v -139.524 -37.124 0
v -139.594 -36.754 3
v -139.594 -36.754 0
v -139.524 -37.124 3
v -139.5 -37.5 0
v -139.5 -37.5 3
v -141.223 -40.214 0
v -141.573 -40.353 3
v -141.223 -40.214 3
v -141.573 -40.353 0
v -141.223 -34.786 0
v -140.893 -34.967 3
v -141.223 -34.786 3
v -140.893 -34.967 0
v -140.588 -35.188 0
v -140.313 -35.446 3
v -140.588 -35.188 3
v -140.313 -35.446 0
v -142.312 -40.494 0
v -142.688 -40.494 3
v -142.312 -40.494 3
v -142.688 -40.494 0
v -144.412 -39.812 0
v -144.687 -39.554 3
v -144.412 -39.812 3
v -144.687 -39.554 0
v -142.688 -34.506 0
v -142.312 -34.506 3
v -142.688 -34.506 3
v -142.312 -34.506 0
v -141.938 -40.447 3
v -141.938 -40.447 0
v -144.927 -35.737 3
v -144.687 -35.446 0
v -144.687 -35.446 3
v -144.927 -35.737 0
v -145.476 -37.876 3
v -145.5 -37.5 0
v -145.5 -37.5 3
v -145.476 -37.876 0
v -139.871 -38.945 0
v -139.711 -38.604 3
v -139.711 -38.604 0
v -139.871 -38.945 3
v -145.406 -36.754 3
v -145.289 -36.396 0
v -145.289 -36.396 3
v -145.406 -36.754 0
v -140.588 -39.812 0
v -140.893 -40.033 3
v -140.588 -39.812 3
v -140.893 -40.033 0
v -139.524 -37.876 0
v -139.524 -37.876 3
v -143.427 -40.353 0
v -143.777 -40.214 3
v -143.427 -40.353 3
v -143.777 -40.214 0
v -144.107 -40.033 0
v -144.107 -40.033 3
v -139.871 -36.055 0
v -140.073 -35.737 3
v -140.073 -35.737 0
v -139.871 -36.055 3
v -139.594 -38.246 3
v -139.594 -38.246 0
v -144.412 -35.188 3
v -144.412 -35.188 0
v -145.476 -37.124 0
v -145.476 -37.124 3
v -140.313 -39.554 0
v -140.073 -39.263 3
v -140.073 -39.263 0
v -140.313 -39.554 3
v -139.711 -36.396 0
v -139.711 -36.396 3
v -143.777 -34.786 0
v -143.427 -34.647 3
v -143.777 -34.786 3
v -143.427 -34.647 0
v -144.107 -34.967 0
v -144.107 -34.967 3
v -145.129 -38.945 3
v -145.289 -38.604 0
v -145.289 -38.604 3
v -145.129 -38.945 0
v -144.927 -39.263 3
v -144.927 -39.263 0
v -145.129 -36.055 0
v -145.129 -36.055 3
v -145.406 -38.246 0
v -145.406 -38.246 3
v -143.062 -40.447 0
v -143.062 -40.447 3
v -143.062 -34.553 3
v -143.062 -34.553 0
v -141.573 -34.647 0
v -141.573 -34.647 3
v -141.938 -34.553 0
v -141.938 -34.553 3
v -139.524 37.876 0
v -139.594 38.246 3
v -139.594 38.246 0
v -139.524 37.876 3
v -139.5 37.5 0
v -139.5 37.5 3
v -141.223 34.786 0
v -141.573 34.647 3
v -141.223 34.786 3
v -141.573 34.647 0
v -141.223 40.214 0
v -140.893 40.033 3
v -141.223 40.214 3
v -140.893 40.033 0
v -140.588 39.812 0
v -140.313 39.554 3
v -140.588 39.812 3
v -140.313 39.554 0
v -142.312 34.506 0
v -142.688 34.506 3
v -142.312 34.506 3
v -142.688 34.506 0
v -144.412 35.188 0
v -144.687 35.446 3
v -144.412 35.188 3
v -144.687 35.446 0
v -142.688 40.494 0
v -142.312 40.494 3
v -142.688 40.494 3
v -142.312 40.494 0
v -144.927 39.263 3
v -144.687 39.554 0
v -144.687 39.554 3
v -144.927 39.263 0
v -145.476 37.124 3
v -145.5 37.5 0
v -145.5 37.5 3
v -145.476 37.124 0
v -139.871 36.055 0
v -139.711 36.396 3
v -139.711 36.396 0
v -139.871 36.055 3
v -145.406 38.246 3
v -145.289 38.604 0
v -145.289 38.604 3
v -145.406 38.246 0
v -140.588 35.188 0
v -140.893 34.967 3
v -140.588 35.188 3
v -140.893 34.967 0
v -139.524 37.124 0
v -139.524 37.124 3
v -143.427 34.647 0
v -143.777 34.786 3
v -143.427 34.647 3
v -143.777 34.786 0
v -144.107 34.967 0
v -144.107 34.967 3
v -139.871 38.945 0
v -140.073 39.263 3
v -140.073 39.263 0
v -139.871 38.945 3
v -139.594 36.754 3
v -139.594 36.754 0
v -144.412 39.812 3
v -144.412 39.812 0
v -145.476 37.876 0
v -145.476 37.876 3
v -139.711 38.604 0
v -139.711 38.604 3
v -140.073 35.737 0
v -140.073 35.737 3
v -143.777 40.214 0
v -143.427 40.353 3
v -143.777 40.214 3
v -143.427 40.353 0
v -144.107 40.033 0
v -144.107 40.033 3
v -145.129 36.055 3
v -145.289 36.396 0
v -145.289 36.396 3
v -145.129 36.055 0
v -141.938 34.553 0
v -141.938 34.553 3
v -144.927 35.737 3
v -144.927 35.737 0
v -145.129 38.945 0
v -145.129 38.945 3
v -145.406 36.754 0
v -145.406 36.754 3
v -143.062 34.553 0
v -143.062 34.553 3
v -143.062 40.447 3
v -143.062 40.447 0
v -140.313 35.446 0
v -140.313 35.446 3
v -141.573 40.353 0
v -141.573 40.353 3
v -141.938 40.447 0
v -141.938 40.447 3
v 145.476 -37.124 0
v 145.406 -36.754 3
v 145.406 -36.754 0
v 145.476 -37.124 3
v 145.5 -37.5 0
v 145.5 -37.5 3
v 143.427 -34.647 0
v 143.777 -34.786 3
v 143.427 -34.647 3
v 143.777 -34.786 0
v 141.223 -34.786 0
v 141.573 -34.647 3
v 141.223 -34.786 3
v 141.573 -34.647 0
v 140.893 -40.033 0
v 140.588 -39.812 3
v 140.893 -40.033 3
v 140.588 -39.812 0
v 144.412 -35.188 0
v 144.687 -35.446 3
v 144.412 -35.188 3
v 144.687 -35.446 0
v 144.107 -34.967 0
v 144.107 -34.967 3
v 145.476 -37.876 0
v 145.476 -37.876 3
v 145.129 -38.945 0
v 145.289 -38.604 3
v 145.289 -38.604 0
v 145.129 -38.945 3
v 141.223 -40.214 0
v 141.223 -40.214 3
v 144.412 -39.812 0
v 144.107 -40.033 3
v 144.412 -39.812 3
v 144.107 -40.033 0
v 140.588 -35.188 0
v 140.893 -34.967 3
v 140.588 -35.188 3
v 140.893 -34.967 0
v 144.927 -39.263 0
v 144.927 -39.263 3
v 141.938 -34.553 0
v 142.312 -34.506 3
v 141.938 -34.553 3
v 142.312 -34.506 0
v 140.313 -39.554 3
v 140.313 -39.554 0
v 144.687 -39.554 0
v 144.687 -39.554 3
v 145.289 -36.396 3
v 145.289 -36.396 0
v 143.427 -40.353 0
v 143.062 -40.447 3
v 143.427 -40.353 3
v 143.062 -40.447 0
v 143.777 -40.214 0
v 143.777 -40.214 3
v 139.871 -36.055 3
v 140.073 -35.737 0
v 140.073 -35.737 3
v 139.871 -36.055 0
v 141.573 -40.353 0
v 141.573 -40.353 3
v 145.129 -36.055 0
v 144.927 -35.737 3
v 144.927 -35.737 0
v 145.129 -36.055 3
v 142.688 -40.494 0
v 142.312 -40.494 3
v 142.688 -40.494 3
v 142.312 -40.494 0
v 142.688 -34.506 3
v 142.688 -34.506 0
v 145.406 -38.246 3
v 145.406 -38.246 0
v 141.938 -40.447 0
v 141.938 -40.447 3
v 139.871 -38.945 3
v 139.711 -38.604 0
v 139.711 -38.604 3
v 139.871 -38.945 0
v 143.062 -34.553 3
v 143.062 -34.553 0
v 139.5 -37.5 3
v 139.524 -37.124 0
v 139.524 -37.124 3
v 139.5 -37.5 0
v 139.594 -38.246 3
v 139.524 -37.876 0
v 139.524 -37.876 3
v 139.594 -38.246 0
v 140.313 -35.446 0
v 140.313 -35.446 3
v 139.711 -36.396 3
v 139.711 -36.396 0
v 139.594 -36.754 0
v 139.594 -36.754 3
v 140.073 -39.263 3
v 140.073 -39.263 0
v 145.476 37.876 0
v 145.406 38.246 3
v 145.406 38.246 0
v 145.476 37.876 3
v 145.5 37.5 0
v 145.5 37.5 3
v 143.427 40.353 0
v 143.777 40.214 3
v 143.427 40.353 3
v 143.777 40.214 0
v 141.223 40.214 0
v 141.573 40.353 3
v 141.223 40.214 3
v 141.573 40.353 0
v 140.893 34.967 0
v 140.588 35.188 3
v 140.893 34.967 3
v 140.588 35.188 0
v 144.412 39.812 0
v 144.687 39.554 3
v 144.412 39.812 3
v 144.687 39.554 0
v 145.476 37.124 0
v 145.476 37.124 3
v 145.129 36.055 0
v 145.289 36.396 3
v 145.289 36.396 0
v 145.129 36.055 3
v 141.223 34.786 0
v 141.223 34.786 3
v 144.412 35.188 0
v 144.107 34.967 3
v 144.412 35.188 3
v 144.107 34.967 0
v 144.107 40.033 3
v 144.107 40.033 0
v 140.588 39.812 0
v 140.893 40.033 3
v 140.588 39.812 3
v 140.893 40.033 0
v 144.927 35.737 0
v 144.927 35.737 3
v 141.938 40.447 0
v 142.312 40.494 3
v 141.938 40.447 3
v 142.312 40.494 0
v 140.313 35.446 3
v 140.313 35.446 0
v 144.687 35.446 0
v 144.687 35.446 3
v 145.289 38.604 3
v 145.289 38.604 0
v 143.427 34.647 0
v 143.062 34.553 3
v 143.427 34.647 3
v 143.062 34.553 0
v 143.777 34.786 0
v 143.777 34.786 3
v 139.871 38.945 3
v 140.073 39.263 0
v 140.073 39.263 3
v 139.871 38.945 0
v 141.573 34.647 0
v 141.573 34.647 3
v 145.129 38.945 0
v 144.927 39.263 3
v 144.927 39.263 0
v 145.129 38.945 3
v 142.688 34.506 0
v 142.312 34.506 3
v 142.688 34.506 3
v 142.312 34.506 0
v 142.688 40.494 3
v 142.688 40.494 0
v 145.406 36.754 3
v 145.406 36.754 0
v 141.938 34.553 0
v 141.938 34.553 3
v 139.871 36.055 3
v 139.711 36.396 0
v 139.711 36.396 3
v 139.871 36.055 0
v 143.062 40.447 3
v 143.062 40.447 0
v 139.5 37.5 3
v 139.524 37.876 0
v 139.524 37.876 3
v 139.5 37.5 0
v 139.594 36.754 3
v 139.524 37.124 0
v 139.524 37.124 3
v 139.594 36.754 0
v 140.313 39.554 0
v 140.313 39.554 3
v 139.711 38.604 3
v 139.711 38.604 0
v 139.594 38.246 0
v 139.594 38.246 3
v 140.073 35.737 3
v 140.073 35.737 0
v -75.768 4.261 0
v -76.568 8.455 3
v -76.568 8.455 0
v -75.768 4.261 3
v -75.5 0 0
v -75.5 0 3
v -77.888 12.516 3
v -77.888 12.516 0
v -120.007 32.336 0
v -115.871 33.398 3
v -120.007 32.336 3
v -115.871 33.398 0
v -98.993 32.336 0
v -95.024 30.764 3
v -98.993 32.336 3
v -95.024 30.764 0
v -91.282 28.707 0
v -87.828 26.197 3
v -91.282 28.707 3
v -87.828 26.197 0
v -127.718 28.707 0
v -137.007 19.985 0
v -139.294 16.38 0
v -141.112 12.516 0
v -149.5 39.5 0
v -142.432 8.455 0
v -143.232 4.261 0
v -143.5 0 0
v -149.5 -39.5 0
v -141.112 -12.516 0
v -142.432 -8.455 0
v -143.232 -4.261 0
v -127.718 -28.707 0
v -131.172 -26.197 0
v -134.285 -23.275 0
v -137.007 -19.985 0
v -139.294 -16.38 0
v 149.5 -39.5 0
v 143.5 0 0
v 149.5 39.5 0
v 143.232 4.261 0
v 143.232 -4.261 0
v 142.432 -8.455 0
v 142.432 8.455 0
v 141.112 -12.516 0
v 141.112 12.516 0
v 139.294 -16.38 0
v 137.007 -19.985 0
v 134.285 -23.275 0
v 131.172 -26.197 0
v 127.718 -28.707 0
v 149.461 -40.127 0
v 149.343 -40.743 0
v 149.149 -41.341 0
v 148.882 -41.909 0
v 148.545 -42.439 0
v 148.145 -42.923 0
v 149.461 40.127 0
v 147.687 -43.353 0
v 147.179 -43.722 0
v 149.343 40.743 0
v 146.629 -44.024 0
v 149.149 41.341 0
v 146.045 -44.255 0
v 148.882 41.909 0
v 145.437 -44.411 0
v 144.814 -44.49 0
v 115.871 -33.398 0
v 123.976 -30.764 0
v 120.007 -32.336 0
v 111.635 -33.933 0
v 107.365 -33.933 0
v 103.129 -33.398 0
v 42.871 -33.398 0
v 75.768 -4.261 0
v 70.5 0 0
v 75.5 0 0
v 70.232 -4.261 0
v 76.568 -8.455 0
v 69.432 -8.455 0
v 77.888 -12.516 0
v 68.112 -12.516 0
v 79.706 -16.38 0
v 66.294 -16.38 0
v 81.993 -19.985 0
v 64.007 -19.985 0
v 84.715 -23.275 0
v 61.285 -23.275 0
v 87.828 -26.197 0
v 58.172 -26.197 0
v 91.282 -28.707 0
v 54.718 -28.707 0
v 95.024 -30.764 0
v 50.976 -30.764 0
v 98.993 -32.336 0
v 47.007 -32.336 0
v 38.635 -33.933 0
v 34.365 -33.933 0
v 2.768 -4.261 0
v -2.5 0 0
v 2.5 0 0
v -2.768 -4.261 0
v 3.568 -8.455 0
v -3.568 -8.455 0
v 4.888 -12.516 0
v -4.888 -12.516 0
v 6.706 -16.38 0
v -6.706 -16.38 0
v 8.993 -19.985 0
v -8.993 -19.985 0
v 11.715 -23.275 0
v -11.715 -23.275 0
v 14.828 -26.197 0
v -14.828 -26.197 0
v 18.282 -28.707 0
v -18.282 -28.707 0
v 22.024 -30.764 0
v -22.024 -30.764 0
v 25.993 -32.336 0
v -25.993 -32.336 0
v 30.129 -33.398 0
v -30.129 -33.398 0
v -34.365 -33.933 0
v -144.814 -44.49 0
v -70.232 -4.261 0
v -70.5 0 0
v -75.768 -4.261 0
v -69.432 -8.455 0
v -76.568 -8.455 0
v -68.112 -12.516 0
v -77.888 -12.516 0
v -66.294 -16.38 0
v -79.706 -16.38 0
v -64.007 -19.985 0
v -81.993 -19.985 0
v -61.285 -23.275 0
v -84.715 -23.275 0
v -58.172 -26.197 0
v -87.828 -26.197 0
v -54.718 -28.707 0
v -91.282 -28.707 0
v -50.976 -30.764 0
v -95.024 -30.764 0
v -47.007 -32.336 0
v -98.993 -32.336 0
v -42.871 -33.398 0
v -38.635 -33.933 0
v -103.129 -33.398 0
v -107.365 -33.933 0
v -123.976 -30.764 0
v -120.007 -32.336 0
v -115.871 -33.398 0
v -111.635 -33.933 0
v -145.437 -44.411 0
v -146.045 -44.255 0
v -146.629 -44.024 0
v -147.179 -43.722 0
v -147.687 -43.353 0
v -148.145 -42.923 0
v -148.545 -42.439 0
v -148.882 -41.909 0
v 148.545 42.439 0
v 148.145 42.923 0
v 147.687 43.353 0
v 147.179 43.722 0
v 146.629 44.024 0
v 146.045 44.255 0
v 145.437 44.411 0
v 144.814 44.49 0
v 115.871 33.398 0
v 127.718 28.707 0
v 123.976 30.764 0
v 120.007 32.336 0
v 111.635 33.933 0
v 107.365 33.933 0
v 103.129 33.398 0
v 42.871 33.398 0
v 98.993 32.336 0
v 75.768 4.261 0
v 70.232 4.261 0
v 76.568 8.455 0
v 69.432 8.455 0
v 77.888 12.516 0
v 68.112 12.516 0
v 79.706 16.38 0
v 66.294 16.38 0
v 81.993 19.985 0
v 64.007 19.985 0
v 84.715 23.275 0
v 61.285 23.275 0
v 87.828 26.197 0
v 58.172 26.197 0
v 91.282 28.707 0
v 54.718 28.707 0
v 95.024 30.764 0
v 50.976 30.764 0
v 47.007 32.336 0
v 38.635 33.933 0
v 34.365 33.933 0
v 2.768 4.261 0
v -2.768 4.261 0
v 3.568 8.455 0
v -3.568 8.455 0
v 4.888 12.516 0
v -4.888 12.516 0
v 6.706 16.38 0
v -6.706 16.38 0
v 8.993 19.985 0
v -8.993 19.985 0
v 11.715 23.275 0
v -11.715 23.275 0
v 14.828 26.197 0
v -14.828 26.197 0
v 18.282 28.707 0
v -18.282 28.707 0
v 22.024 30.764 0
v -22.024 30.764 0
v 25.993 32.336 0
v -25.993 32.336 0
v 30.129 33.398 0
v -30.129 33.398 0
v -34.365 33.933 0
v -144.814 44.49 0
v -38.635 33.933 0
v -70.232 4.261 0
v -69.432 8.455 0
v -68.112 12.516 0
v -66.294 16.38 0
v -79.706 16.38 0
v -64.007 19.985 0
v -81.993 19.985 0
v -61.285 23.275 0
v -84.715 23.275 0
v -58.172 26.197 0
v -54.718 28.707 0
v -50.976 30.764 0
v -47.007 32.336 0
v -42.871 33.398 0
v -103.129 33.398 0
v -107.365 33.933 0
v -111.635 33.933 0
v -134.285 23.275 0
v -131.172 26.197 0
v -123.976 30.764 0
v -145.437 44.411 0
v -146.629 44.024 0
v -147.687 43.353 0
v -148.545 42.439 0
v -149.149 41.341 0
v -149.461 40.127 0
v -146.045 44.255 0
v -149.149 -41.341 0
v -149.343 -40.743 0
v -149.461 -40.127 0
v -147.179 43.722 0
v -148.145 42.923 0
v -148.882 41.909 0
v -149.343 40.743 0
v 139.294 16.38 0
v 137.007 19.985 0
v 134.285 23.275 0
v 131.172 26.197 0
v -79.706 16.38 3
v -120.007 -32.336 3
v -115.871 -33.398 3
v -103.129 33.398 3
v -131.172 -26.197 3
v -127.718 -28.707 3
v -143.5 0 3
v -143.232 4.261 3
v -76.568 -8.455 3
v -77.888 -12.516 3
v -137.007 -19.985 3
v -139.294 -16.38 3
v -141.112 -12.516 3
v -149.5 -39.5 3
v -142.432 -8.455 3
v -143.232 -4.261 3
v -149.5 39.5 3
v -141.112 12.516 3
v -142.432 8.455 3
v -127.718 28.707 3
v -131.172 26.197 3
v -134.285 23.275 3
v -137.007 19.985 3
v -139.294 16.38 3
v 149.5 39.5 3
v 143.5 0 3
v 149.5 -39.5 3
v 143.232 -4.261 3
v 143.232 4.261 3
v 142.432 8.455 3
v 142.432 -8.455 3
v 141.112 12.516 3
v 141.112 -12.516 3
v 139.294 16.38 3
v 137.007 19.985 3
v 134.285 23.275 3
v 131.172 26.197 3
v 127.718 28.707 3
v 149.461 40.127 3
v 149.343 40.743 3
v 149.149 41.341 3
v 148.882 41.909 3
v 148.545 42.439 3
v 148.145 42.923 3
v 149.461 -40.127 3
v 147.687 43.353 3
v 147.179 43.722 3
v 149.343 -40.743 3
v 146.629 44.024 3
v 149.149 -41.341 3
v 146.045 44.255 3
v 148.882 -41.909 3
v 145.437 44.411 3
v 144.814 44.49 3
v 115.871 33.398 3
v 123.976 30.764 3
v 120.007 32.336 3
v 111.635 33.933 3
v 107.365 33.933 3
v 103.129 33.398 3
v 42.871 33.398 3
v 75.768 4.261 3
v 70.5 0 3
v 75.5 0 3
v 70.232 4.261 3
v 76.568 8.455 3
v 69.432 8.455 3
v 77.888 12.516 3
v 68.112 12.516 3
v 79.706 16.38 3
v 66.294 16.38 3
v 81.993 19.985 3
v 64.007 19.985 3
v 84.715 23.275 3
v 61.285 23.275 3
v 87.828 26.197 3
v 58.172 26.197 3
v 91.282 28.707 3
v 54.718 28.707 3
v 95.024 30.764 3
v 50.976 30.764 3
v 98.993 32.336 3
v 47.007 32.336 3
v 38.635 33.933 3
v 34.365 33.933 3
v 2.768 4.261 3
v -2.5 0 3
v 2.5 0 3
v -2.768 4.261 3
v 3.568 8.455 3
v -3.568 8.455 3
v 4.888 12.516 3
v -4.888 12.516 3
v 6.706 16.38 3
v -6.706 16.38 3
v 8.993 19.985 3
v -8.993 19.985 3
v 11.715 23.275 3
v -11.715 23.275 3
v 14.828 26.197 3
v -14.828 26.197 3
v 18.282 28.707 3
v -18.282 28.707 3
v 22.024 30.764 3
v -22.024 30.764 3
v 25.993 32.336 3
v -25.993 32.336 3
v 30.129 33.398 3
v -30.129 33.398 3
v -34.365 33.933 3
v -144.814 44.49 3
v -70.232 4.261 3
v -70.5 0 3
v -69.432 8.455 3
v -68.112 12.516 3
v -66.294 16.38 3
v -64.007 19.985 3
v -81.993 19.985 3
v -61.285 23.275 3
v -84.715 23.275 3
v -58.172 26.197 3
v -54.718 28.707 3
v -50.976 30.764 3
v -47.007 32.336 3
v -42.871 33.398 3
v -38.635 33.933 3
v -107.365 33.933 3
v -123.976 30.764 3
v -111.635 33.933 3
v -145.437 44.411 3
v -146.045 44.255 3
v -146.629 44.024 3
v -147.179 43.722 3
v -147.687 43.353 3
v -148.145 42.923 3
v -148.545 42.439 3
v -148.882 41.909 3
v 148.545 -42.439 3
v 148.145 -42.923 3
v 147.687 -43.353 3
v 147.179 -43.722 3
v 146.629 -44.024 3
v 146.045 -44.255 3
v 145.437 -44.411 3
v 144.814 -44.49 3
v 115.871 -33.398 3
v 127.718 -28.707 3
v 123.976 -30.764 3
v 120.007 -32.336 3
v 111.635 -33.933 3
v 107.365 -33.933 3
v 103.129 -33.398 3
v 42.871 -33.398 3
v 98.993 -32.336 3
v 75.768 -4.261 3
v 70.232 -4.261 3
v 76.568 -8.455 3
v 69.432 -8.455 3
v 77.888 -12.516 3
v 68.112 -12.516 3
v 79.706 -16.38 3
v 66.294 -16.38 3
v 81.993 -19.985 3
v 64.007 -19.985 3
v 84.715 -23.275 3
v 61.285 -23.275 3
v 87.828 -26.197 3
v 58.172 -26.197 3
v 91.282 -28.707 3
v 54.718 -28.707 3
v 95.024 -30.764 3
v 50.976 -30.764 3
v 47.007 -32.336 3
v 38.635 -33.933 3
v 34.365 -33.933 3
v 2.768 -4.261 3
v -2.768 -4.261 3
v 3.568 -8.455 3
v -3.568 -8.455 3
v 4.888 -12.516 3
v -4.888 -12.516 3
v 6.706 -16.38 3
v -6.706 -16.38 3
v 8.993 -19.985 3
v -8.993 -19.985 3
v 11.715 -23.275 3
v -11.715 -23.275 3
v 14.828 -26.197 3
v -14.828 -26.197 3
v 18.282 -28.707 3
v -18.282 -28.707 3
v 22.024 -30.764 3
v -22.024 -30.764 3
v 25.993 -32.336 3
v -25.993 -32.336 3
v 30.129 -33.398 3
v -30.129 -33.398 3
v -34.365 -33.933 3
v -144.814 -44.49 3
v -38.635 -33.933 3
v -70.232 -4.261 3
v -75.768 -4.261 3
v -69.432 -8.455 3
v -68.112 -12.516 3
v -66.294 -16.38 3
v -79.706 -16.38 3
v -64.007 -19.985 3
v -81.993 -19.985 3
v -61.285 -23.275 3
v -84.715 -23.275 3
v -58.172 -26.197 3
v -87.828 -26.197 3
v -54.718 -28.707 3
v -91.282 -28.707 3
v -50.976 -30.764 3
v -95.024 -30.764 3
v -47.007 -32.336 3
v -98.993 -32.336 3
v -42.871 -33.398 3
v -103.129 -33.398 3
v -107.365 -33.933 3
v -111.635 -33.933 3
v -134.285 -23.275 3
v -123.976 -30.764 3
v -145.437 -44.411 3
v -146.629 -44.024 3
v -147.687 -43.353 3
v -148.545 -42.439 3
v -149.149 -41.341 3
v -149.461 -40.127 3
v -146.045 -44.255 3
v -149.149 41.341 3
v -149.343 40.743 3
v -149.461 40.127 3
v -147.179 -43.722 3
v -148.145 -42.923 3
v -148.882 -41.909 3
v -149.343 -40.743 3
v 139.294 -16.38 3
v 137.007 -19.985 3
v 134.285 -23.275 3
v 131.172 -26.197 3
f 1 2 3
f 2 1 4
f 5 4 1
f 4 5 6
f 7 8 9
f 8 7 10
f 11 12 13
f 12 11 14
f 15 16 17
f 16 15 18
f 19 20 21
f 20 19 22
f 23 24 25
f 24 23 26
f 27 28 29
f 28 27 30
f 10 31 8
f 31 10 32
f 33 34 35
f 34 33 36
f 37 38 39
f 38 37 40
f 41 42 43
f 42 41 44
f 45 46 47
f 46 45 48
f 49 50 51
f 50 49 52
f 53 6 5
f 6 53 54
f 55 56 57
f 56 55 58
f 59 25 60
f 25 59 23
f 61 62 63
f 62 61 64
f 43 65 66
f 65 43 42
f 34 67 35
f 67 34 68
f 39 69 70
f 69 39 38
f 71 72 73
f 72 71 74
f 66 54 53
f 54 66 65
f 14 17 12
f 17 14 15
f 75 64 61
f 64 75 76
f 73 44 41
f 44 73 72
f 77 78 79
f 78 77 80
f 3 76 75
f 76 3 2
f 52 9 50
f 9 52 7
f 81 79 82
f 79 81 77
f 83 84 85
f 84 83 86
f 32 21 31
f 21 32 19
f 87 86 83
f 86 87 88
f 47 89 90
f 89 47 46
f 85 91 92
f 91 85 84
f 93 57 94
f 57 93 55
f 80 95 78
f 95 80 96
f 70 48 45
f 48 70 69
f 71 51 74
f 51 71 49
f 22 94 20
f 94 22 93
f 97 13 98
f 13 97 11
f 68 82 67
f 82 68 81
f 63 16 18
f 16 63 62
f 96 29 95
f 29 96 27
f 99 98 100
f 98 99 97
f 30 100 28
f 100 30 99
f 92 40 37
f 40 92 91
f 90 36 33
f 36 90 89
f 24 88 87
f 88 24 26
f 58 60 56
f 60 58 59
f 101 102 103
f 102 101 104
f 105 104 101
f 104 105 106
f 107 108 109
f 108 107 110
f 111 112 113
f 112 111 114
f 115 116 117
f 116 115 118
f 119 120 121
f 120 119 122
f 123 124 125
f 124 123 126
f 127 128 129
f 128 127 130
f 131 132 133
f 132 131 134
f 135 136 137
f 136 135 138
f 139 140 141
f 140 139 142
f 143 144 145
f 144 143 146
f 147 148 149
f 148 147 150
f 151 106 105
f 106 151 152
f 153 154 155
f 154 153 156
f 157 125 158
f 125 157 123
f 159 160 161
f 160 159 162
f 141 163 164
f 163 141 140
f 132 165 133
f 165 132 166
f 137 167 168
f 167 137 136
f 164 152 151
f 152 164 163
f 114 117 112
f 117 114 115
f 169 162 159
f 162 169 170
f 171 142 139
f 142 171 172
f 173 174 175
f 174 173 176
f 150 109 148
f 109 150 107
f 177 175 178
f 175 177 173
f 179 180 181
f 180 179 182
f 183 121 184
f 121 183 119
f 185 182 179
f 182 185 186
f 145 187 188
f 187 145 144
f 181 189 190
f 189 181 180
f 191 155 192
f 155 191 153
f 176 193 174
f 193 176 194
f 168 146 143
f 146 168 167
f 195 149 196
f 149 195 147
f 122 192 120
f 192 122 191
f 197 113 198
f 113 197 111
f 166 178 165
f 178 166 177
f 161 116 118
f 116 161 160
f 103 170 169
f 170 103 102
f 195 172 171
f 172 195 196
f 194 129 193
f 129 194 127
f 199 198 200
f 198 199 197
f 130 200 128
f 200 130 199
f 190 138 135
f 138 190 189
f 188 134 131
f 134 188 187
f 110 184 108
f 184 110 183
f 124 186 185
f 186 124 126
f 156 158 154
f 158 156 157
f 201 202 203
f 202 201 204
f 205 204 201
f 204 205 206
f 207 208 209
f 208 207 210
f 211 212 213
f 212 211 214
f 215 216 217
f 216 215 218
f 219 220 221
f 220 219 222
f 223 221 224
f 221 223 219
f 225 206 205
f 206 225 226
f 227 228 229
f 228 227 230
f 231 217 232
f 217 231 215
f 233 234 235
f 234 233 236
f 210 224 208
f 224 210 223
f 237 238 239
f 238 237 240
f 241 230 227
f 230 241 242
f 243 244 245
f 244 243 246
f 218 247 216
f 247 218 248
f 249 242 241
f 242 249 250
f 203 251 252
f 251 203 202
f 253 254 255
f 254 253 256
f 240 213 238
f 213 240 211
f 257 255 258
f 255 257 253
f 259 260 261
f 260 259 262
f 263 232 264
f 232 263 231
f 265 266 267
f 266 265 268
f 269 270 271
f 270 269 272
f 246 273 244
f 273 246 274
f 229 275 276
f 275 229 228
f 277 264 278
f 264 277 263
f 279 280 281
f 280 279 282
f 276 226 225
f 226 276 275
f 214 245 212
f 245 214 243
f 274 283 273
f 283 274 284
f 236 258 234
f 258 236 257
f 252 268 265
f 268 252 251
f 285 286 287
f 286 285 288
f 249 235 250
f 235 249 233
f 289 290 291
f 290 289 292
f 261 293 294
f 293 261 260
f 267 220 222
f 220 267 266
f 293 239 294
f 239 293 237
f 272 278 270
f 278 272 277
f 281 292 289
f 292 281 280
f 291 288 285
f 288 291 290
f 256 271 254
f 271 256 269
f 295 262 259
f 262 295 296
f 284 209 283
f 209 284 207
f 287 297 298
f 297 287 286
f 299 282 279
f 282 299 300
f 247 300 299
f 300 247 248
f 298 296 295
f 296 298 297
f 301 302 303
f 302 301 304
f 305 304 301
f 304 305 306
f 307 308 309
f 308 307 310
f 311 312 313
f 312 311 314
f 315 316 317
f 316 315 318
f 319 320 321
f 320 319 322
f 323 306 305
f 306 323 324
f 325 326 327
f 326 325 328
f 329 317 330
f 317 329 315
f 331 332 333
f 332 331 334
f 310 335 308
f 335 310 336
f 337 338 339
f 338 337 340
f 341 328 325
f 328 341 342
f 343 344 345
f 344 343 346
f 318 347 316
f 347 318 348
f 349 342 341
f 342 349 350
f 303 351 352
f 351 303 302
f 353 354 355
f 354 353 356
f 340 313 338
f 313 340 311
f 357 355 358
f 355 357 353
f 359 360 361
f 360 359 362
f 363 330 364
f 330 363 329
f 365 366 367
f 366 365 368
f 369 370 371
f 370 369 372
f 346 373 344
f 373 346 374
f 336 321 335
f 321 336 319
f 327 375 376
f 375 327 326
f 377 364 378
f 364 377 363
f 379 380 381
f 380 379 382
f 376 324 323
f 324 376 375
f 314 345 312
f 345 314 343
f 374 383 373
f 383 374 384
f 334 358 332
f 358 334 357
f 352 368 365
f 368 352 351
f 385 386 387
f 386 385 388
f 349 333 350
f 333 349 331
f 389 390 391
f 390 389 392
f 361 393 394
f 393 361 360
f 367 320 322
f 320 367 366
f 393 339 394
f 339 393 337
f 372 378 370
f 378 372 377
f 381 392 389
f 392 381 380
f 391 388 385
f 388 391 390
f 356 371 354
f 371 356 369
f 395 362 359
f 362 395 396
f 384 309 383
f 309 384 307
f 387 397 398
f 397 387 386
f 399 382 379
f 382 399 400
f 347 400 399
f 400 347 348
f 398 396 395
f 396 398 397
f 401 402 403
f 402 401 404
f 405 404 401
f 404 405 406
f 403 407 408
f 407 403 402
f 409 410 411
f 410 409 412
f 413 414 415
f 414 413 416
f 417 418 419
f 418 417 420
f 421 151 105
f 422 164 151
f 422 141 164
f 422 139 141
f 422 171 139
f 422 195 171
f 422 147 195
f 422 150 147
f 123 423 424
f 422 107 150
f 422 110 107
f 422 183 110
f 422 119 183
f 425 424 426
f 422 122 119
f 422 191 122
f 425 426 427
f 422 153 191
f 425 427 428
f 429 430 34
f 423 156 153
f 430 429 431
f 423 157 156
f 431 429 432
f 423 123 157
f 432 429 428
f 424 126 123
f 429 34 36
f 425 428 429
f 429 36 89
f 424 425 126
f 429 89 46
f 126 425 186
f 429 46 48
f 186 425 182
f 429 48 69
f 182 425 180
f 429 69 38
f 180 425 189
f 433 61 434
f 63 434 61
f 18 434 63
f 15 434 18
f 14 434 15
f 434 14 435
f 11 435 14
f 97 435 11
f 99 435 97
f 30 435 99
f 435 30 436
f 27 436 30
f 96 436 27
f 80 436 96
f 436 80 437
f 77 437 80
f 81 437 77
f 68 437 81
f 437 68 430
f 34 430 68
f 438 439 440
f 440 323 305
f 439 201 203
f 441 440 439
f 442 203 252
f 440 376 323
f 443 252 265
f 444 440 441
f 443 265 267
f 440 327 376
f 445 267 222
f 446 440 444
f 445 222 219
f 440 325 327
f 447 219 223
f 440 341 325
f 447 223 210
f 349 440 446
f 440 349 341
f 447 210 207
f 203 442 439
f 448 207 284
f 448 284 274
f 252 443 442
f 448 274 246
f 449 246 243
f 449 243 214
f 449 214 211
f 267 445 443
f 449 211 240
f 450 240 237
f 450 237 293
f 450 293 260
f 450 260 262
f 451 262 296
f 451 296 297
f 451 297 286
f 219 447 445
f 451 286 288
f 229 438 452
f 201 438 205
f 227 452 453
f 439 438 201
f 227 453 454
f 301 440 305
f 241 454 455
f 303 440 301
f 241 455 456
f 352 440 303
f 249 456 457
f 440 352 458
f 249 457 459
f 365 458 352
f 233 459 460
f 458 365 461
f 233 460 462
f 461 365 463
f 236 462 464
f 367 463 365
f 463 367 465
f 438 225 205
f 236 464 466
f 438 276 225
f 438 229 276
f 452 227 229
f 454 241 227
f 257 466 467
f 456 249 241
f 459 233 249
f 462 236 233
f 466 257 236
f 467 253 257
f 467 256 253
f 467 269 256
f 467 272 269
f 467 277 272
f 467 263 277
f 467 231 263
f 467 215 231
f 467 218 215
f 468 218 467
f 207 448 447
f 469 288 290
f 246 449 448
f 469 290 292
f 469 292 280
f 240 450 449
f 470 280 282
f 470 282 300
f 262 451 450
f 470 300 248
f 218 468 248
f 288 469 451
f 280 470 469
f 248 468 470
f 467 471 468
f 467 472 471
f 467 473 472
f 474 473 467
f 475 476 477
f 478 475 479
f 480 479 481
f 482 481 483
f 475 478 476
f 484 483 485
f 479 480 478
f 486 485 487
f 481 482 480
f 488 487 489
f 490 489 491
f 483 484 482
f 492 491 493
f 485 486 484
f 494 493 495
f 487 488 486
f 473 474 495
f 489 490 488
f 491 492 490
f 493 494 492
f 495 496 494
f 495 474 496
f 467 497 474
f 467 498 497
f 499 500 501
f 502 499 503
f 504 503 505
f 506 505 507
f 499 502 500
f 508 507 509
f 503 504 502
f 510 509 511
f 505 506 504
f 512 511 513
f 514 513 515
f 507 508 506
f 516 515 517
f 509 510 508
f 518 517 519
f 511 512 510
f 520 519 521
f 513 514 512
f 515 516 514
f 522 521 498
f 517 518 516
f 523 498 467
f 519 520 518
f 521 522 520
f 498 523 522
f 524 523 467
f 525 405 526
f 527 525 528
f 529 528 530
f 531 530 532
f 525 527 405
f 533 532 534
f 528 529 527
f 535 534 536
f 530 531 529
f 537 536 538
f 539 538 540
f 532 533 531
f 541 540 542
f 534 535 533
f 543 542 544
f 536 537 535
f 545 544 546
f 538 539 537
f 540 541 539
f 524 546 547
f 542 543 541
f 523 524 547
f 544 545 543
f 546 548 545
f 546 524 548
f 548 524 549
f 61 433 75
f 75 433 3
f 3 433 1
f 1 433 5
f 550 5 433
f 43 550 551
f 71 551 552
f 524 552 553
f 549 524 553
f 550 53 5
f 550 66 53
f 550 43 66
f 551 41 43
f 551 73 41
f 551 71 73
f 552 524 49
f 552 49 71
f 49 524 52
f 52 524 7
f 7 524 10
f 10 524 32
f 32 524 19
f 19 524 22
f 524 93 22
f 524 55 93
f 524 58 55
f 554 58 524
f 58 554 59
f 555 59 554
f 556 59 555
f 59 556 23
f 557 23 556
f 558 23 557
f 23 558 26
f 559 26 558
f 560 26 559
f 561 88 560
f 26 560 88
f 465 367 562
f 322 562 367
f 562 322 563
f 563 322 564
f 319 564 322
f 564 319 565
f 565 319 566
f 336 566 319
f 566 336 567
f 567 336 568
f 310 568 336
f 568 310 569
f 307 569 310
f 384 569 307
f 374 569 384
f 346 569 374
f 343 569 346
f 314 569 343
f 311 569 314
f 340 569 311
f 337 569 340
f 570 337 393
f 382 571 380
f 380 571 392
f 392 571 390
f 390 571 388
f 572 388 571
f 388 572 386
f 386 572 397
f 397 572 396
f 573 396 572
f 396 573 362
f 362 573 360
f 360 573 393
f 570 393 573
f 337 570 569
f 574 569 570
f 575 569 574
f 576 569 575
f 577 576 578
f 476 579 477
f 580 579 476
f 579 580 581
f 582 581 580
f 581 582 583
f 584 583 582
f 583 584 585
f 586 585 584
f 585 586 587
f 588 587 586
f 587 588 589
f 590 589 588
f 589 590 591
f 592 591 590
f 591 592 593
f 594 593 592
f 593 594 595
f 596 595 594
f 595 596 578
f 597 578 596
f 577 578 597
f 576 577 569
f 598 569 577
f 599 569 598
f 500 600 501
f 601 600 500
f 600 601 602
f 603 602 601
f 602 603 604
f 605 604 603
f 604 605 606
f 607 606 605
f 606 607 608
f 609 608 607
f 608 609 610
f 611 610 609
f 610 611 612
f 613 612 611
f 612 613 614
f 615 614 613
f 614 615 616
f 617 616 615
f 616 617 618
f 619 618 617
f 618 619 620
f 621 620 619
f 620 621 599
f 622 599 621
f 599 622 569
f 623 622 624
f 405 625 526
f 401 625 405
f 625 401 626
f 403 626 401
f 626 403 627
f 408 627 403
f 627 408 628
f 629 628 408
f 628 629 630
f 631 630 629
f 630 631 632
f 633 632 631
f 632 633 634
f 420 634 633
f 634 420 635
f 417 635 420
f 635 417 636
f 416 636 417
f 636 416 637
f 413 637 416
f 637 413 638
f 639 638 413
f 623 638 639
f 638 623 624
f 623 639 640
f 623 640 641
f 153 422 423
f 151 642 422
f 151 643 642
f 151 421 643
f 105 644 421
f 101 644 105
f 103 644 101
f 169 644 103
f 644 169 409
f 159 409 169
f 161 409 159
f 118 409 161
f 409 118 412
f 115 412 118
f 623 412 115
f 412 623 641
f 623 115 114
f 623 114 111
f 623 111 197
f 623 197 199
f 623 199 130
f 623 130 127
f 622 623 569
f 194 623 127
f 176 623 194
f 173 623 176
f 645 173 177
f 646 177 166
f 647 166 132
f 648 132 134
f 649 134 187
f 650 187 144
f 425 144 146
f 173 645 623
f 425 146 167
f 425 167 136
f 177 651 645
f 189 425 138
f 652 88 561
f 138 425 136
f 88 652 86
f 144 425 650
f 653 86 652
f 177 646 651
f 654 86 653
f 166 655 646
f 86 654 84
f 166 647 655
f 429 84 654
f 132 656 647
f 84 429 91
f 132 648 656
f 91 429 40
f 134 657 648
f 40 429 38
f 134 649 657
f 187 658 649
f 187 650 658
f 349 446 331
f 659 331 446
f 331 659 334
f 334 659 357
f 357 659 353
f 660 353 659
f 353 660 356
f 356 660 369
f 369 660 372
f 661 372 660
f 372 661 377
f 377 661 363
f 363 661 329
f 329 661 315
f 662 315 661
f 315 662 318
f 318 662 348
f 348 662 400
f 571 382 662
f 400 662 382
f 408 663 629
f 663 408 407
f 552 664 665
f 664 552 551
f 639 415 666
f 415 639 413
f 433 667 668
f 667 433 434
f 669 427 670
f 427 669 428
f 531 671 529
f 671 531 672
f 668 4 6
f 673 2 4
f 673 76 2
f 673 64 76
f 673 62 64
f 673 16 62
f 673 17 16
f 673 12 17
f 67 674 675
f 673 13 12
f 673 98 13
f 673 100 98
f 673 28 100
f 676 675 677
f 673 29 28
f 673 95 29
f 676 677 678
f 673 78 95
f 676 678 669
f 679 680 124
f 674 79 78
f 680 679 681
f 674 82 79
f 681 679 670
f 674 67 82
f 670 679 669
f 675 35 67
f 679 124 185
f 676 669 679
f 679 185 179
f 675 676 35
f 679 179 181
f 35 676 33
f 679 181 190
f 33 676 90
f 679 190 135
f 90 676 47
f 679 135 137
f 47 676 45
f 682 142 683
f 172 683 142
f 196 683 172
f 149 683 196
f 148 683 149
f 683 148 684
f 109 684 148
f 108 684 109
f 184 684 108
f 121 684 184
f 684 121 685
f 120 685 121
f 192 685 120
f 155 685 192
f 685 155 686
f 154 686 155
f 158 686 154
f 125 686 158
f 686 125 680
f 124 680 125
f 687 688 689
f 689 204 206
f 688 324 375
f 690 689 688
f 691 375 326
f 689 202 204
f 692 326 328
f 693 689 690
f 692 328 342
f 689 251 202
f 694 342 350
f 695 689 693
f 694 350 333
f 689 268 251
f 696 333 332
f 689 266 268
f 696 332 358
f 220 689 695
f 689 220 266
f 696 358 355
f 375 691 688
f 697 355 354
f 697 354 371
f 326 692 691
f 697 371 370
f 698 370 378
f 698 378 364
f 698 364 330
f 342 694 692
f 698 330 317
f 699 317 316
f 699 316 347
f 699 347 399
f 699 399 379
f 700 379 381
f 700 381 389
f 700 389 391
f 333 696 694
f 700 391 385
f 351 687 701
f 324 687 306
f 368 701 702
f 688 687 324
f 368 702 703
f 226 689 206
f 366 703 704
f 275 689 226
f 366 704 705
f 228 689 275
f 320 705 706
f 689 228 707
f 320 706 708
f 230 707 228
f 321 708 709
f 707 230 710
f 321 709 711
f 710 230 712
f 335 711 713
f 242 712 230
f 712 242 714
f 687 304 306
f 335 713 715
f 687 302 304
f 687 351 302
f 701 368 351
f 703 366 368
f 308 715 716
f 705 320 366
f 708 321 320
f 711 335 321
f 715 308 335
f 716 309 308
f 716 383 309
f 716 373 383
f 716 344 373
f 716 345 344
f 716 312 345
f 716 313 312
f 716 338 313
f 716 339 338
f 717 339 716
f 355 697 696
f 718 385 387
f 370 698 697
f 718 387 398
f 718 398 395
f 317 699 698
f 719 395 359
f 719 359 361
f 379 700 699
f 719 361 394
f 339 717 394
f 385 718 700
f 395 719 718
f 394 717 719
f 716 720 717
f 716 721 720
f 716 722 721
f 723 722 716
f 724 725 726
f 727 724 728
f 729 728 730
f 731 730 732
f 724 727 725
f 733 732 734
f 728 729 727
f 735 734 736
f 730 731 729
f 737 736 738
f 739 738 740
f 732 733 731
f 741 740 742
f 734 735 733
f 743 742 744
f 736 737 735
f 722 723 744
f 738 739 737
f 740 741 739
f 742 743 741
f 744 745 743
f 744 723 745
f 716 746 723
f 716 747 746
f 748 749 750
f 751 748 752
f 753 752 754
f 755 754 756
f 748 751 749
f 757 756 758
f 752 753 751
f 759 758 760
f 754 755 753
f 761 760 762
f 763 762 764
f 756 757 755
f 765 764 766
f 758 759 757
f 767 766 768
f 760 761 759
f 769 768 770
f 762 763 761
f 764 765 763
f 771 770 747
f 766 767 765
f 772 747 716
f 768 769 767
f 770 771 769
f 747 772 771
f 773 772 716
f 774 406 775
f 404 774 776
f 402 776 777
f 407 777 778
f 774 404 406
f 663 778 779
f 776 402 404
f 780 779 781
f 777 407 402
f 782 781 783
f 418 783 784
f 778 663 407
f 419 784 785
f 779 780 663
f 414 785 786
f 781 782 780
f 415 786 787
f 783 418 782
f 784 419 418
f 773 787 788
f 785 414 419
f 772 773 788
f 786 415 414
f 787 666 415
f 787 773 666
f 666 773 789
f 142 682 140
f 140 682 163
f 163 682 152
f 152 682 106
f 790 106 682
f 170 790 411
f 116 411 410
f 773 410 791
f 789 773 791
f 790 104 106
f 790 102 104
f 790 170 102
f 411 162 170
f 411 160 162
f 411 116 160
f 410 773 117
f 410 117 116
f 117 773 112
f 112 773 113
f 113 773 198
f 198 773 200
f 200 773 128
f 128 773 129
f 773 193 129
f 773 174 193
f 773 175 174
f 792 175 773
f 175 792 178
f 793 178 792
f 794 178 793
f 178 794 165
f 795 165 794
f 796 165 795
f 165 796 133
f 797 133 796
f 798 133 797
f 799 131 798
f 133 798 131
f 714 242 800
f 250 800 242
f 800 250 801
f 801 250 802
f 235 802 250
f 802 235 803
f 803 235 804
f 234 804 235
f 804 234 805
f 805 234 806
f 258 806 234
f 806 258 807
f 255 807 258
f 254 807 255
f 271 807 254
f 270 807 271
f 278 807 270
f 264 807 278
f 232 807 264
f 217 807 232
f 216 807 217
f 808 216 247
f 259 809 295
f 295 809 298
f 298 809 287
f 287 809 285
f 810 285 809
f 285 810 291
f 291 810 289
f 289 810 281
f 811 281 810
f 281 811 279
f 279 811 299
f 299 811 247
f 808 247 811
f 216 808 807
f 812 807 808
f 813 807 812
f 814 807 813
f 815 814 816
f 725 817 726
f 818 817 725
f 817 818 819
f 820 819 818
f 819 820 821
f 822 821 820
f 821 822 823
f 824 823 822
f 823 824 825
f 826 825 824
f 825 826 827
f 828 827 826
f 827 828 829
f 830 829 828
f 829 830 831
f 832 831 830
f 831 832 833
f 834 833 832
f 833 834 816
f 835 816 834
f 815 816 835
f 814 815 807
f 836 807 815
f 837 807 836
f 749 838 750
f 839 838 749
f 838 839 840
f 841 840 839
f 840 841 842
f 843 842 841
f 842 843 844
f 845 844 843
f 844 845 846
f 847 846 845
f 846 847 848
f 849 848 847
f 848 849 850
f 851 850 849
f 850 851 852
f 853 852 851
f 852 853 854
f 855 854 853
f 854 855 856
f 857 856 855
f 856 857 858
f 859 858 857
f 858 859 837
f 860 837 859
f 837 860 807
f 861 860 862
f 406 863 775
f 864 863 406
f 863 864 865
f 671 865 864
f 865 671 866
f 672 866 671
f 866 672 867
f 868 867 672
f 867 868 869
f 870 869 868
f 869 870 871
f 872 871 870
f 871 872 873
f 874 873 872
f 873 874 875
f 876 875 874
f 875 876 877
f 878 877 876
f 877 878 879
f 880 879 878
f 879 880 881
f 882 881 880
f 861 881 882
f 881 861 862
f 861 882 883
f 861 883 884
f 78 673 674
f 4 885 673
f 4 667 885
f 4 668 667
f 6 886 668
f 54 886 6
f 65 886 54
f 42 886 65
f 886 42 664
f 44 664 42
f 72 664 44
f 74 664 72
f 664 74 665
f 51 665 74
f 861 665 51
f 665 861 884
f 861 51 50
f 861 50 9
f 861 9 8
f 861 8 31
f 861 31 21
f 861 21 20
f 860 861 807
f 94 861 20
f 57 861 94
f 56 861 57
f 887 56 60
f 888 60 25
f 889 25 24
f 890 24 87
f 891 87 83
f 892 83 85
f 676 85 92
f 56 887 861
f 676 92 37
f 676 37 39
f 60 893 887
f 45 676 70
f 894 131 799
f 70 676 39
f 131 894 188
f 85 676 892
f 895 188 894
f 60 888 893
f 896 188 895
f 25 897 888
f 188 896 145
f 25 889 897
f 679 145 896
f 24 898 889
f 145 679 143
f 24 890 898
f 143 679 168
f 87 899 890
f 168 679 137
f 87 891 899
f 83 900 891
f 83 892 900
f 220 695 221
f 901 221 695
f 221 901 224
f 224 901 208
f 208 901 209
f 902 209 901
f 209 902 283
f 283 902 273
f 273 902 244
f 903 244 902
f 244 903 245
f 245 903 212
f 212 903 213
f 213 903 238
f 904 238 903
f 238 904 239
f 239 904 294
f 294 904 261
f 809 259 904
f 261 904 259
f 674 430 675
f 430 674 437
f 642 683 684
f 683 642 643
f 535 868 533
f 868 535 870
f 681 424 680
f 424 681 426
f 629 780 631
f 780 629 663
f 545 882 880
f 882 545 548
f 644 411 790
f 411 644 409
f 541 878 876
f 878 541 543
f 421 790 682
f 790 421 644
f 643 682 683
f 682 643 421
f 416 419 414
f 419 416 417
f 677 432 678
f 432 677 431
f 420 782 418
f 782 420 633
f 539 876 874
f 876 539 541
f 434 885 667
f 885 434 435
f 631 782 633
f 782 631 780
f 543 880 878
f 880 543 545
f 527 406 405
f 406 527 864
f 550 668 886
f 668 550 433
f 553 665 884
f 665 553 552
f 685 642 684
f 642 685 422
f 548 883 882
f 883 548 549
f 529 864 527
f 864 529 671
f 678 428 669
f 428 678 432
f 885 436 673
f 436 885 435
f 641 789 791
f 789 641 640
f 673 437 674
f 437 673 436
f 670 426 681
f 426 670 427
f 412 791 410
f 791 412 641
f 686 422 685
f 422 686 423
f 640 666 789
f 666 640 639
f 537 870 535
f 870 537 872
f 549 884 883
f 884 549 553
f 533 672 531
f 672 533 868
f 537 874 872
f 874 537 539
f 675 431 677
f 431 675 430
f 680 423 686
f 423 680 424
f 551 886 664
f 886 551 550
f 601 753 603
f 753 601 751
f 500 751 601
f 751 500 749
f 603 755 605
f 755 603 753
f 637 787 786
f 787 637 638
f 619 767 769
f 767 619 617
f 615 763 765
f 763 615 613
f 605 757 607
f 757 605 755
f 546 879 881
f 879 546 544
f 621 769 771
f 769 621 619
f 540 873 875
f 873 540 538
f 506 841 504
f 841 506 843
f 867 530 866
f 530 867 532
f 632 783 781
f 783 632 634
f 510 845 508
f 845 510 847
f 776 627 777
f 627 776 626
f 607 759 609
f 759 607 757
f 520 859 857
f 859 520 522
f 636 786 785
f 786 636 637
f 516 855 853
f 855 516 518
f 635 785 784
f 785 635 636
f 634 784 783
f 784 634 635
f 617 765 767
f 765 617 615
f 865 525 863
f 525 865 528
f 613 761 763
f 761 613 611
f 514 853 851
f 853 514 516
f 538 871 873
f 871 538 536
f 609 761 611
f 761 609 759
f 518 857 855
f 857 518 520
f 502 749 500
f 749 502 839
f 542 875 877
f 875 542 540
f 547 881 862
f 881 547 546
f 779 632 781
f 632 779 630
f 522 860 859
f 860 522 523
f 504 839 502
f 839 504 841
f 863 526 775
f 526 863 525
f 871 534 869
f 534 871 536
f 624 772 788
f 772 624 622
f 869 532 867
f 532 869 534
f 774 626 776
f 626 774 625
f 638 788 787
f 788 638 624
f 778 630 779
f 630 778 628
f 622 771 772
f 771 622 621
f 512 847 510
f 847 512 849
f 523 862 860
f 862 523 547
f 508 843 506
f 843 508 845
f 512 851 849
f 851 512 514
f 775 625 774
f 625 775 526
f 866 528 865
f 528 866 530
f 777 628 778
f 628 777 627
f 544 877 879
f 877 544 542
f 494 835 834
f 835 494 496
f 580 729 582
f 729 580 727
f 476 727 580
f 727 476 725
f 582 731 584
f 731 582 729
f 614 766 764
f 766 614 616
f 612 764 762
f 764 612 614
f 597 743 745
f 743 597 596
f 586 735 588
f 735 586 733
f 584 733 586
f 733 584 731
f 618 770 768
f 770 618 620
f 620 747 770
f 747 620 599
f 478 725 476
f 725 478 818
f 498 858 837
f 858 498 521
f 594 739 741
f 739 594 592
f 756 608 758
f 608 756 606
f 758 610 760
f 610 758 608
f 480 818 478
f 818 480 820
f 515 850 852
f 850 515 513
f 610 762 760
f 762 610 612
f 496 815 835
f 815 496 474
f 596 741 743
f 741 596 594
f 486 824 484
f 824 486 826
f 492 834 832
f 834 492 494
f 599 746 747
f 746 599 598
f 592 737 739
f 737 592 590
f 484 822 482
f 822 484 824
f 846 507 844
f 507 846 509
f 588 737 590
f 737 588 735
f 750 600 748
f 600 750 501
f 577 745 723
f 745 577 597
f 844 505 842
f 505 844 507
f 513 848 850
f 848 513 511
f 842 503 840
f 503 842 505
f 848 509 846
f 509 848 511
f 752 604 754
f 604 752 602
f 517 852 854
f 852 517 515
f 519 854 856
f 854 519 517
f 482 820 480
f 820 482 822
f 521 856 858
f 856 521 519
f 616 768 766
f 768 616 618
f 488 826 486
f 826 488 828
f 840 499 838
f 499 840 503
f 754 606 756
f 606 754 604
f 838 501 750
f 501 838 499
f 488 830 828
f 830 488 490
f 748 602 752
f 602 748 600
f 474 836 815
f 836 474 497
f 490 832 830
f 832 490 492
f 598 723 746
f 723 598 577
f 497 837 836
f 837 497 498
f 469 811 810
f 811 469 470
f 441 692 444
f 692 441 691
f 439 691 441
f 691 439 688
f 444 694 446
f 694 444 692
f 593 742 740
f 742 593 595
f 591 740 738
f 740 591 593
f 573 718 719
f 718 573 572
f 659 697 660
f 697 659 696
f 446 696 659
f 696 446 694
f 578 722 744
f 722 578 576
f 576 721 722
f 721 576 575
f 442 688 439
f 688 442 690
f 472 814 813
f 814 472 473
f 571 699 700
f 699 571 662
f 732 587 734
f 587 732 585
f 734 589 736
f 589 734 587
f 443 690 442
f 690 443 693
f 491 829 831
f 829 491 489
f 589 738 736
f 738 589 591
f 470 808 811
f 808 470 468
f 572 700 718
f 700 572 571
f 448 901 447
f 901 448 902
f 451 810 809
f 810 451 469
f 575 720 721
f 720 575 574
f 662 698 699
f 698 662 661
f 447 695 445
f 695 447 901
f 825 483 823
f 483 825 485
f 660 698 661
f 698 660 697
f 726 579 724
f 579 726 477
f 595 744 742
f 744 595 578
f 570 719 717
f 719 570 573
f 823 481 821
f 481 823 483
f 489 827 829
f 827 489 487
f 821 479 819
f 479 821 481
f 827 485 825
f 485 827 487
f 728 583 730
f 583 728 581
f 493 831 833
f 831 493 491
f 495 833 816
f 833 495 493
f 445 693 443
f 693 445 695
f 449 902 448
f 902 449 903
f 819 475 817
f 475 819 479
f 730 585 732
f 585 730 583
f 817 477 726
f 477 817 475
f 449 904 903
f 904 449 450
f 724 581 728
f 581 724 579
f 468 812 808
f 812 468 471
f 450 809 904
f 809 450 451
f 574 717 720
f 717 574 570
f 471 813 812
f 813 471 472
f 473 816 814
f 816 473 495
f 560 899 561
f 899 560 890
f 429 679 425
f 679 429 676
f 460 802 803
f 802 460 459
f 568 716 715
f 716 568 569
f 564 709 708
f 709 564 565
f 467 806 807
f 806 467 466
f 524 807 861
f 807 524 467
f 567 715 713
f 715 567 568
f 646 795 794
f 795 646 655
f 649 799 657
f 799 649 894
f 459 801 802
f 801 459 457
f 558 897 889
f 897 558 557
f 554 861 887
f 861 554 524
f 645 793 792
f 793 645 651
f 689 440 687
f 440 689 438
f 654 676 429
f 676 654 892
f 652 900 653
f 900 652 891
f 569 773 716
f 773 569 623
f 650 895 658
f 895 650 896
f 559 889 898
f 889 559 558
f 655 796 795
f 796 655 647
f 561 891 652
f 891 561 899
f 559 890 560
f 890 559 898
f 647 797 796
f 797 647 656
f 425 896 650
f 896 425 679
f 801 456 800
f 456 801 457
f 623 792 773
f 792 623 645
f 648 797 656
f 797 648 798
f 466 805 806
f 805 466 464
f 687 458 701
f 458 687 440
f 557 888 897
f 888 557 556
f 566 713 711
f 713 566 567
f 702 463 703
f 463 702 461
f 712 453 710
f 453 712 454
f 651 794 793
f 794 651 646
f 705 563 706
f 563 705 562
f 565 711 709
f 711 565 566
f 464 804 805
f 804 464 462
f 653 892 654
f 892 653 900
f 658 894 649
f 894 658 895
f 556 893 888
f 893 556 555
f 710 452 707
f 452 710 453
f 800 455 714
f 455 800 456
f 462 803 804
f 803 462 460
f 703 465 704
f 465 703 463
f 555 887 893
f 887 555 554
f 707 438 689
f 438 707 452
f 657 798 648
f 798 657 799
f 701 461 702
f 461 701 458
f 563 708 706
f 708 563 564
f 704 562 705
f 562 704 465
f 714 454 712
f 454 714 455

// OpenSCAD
$fn = 50;


difference() {
	union() {
		hull() {
			translate(v = [-144.5000000000, 39.5000000000, 0]) {
				cylinder(h = 3, r = 5);
			}
			translate(v = [144.5000000000, 39.5000000000, 0]) {
				cylinder(h = 3, r = 5);
			}
			translate(v = [-144.5000000000, -39.5000000000, 0]) {
				cylinder(h = 3, r = 5);
			}
			translate(v = [144.5000000000, -39.5000000000, 0]) {
				cylinder(h = 3, r = 5);
			}
		}
	}
	union() {
		#translate(v = [-142.5000000000, -37.5000000000, -100.0000000000]) {
			cylinder(h = 200, r = 3.0000000000);
		}
		#translate(v = [-142.5000000000, 37.5000000000, -100.0000000000]) {
			cylinder(h = 200, r = 3.0000000000);
		}
		#translate(v = [142.5000000000, -37.5000000000, -100.0000000000]) {
			cylinder(h = 200, r = 3.0000000000);
		}
		#translate(v = [142.5000000000, 37.5000000000, -100.0000000000]) {
			cylinder(h = 200, r = 3.0000000000);
		}
		#translate(v = [-109.5000000000, 0, 0]) {
			cylinder(h = 3, r = 34.0000000000);
		}
		#translate(v = [-36.5000000000, 0, 0]) {
			cylinder(h = 3, r = 34.0000000000);
		}
		#translate(v = [36.5000000000, 0, 0]) {
			cylinder(h = 3, r = 34.0000000000);
		}
		#translate(v = [109.5000000000, 0, 0]) {
			cylinder(h = 3, r = 34.0000000000);
		}
	}
}
